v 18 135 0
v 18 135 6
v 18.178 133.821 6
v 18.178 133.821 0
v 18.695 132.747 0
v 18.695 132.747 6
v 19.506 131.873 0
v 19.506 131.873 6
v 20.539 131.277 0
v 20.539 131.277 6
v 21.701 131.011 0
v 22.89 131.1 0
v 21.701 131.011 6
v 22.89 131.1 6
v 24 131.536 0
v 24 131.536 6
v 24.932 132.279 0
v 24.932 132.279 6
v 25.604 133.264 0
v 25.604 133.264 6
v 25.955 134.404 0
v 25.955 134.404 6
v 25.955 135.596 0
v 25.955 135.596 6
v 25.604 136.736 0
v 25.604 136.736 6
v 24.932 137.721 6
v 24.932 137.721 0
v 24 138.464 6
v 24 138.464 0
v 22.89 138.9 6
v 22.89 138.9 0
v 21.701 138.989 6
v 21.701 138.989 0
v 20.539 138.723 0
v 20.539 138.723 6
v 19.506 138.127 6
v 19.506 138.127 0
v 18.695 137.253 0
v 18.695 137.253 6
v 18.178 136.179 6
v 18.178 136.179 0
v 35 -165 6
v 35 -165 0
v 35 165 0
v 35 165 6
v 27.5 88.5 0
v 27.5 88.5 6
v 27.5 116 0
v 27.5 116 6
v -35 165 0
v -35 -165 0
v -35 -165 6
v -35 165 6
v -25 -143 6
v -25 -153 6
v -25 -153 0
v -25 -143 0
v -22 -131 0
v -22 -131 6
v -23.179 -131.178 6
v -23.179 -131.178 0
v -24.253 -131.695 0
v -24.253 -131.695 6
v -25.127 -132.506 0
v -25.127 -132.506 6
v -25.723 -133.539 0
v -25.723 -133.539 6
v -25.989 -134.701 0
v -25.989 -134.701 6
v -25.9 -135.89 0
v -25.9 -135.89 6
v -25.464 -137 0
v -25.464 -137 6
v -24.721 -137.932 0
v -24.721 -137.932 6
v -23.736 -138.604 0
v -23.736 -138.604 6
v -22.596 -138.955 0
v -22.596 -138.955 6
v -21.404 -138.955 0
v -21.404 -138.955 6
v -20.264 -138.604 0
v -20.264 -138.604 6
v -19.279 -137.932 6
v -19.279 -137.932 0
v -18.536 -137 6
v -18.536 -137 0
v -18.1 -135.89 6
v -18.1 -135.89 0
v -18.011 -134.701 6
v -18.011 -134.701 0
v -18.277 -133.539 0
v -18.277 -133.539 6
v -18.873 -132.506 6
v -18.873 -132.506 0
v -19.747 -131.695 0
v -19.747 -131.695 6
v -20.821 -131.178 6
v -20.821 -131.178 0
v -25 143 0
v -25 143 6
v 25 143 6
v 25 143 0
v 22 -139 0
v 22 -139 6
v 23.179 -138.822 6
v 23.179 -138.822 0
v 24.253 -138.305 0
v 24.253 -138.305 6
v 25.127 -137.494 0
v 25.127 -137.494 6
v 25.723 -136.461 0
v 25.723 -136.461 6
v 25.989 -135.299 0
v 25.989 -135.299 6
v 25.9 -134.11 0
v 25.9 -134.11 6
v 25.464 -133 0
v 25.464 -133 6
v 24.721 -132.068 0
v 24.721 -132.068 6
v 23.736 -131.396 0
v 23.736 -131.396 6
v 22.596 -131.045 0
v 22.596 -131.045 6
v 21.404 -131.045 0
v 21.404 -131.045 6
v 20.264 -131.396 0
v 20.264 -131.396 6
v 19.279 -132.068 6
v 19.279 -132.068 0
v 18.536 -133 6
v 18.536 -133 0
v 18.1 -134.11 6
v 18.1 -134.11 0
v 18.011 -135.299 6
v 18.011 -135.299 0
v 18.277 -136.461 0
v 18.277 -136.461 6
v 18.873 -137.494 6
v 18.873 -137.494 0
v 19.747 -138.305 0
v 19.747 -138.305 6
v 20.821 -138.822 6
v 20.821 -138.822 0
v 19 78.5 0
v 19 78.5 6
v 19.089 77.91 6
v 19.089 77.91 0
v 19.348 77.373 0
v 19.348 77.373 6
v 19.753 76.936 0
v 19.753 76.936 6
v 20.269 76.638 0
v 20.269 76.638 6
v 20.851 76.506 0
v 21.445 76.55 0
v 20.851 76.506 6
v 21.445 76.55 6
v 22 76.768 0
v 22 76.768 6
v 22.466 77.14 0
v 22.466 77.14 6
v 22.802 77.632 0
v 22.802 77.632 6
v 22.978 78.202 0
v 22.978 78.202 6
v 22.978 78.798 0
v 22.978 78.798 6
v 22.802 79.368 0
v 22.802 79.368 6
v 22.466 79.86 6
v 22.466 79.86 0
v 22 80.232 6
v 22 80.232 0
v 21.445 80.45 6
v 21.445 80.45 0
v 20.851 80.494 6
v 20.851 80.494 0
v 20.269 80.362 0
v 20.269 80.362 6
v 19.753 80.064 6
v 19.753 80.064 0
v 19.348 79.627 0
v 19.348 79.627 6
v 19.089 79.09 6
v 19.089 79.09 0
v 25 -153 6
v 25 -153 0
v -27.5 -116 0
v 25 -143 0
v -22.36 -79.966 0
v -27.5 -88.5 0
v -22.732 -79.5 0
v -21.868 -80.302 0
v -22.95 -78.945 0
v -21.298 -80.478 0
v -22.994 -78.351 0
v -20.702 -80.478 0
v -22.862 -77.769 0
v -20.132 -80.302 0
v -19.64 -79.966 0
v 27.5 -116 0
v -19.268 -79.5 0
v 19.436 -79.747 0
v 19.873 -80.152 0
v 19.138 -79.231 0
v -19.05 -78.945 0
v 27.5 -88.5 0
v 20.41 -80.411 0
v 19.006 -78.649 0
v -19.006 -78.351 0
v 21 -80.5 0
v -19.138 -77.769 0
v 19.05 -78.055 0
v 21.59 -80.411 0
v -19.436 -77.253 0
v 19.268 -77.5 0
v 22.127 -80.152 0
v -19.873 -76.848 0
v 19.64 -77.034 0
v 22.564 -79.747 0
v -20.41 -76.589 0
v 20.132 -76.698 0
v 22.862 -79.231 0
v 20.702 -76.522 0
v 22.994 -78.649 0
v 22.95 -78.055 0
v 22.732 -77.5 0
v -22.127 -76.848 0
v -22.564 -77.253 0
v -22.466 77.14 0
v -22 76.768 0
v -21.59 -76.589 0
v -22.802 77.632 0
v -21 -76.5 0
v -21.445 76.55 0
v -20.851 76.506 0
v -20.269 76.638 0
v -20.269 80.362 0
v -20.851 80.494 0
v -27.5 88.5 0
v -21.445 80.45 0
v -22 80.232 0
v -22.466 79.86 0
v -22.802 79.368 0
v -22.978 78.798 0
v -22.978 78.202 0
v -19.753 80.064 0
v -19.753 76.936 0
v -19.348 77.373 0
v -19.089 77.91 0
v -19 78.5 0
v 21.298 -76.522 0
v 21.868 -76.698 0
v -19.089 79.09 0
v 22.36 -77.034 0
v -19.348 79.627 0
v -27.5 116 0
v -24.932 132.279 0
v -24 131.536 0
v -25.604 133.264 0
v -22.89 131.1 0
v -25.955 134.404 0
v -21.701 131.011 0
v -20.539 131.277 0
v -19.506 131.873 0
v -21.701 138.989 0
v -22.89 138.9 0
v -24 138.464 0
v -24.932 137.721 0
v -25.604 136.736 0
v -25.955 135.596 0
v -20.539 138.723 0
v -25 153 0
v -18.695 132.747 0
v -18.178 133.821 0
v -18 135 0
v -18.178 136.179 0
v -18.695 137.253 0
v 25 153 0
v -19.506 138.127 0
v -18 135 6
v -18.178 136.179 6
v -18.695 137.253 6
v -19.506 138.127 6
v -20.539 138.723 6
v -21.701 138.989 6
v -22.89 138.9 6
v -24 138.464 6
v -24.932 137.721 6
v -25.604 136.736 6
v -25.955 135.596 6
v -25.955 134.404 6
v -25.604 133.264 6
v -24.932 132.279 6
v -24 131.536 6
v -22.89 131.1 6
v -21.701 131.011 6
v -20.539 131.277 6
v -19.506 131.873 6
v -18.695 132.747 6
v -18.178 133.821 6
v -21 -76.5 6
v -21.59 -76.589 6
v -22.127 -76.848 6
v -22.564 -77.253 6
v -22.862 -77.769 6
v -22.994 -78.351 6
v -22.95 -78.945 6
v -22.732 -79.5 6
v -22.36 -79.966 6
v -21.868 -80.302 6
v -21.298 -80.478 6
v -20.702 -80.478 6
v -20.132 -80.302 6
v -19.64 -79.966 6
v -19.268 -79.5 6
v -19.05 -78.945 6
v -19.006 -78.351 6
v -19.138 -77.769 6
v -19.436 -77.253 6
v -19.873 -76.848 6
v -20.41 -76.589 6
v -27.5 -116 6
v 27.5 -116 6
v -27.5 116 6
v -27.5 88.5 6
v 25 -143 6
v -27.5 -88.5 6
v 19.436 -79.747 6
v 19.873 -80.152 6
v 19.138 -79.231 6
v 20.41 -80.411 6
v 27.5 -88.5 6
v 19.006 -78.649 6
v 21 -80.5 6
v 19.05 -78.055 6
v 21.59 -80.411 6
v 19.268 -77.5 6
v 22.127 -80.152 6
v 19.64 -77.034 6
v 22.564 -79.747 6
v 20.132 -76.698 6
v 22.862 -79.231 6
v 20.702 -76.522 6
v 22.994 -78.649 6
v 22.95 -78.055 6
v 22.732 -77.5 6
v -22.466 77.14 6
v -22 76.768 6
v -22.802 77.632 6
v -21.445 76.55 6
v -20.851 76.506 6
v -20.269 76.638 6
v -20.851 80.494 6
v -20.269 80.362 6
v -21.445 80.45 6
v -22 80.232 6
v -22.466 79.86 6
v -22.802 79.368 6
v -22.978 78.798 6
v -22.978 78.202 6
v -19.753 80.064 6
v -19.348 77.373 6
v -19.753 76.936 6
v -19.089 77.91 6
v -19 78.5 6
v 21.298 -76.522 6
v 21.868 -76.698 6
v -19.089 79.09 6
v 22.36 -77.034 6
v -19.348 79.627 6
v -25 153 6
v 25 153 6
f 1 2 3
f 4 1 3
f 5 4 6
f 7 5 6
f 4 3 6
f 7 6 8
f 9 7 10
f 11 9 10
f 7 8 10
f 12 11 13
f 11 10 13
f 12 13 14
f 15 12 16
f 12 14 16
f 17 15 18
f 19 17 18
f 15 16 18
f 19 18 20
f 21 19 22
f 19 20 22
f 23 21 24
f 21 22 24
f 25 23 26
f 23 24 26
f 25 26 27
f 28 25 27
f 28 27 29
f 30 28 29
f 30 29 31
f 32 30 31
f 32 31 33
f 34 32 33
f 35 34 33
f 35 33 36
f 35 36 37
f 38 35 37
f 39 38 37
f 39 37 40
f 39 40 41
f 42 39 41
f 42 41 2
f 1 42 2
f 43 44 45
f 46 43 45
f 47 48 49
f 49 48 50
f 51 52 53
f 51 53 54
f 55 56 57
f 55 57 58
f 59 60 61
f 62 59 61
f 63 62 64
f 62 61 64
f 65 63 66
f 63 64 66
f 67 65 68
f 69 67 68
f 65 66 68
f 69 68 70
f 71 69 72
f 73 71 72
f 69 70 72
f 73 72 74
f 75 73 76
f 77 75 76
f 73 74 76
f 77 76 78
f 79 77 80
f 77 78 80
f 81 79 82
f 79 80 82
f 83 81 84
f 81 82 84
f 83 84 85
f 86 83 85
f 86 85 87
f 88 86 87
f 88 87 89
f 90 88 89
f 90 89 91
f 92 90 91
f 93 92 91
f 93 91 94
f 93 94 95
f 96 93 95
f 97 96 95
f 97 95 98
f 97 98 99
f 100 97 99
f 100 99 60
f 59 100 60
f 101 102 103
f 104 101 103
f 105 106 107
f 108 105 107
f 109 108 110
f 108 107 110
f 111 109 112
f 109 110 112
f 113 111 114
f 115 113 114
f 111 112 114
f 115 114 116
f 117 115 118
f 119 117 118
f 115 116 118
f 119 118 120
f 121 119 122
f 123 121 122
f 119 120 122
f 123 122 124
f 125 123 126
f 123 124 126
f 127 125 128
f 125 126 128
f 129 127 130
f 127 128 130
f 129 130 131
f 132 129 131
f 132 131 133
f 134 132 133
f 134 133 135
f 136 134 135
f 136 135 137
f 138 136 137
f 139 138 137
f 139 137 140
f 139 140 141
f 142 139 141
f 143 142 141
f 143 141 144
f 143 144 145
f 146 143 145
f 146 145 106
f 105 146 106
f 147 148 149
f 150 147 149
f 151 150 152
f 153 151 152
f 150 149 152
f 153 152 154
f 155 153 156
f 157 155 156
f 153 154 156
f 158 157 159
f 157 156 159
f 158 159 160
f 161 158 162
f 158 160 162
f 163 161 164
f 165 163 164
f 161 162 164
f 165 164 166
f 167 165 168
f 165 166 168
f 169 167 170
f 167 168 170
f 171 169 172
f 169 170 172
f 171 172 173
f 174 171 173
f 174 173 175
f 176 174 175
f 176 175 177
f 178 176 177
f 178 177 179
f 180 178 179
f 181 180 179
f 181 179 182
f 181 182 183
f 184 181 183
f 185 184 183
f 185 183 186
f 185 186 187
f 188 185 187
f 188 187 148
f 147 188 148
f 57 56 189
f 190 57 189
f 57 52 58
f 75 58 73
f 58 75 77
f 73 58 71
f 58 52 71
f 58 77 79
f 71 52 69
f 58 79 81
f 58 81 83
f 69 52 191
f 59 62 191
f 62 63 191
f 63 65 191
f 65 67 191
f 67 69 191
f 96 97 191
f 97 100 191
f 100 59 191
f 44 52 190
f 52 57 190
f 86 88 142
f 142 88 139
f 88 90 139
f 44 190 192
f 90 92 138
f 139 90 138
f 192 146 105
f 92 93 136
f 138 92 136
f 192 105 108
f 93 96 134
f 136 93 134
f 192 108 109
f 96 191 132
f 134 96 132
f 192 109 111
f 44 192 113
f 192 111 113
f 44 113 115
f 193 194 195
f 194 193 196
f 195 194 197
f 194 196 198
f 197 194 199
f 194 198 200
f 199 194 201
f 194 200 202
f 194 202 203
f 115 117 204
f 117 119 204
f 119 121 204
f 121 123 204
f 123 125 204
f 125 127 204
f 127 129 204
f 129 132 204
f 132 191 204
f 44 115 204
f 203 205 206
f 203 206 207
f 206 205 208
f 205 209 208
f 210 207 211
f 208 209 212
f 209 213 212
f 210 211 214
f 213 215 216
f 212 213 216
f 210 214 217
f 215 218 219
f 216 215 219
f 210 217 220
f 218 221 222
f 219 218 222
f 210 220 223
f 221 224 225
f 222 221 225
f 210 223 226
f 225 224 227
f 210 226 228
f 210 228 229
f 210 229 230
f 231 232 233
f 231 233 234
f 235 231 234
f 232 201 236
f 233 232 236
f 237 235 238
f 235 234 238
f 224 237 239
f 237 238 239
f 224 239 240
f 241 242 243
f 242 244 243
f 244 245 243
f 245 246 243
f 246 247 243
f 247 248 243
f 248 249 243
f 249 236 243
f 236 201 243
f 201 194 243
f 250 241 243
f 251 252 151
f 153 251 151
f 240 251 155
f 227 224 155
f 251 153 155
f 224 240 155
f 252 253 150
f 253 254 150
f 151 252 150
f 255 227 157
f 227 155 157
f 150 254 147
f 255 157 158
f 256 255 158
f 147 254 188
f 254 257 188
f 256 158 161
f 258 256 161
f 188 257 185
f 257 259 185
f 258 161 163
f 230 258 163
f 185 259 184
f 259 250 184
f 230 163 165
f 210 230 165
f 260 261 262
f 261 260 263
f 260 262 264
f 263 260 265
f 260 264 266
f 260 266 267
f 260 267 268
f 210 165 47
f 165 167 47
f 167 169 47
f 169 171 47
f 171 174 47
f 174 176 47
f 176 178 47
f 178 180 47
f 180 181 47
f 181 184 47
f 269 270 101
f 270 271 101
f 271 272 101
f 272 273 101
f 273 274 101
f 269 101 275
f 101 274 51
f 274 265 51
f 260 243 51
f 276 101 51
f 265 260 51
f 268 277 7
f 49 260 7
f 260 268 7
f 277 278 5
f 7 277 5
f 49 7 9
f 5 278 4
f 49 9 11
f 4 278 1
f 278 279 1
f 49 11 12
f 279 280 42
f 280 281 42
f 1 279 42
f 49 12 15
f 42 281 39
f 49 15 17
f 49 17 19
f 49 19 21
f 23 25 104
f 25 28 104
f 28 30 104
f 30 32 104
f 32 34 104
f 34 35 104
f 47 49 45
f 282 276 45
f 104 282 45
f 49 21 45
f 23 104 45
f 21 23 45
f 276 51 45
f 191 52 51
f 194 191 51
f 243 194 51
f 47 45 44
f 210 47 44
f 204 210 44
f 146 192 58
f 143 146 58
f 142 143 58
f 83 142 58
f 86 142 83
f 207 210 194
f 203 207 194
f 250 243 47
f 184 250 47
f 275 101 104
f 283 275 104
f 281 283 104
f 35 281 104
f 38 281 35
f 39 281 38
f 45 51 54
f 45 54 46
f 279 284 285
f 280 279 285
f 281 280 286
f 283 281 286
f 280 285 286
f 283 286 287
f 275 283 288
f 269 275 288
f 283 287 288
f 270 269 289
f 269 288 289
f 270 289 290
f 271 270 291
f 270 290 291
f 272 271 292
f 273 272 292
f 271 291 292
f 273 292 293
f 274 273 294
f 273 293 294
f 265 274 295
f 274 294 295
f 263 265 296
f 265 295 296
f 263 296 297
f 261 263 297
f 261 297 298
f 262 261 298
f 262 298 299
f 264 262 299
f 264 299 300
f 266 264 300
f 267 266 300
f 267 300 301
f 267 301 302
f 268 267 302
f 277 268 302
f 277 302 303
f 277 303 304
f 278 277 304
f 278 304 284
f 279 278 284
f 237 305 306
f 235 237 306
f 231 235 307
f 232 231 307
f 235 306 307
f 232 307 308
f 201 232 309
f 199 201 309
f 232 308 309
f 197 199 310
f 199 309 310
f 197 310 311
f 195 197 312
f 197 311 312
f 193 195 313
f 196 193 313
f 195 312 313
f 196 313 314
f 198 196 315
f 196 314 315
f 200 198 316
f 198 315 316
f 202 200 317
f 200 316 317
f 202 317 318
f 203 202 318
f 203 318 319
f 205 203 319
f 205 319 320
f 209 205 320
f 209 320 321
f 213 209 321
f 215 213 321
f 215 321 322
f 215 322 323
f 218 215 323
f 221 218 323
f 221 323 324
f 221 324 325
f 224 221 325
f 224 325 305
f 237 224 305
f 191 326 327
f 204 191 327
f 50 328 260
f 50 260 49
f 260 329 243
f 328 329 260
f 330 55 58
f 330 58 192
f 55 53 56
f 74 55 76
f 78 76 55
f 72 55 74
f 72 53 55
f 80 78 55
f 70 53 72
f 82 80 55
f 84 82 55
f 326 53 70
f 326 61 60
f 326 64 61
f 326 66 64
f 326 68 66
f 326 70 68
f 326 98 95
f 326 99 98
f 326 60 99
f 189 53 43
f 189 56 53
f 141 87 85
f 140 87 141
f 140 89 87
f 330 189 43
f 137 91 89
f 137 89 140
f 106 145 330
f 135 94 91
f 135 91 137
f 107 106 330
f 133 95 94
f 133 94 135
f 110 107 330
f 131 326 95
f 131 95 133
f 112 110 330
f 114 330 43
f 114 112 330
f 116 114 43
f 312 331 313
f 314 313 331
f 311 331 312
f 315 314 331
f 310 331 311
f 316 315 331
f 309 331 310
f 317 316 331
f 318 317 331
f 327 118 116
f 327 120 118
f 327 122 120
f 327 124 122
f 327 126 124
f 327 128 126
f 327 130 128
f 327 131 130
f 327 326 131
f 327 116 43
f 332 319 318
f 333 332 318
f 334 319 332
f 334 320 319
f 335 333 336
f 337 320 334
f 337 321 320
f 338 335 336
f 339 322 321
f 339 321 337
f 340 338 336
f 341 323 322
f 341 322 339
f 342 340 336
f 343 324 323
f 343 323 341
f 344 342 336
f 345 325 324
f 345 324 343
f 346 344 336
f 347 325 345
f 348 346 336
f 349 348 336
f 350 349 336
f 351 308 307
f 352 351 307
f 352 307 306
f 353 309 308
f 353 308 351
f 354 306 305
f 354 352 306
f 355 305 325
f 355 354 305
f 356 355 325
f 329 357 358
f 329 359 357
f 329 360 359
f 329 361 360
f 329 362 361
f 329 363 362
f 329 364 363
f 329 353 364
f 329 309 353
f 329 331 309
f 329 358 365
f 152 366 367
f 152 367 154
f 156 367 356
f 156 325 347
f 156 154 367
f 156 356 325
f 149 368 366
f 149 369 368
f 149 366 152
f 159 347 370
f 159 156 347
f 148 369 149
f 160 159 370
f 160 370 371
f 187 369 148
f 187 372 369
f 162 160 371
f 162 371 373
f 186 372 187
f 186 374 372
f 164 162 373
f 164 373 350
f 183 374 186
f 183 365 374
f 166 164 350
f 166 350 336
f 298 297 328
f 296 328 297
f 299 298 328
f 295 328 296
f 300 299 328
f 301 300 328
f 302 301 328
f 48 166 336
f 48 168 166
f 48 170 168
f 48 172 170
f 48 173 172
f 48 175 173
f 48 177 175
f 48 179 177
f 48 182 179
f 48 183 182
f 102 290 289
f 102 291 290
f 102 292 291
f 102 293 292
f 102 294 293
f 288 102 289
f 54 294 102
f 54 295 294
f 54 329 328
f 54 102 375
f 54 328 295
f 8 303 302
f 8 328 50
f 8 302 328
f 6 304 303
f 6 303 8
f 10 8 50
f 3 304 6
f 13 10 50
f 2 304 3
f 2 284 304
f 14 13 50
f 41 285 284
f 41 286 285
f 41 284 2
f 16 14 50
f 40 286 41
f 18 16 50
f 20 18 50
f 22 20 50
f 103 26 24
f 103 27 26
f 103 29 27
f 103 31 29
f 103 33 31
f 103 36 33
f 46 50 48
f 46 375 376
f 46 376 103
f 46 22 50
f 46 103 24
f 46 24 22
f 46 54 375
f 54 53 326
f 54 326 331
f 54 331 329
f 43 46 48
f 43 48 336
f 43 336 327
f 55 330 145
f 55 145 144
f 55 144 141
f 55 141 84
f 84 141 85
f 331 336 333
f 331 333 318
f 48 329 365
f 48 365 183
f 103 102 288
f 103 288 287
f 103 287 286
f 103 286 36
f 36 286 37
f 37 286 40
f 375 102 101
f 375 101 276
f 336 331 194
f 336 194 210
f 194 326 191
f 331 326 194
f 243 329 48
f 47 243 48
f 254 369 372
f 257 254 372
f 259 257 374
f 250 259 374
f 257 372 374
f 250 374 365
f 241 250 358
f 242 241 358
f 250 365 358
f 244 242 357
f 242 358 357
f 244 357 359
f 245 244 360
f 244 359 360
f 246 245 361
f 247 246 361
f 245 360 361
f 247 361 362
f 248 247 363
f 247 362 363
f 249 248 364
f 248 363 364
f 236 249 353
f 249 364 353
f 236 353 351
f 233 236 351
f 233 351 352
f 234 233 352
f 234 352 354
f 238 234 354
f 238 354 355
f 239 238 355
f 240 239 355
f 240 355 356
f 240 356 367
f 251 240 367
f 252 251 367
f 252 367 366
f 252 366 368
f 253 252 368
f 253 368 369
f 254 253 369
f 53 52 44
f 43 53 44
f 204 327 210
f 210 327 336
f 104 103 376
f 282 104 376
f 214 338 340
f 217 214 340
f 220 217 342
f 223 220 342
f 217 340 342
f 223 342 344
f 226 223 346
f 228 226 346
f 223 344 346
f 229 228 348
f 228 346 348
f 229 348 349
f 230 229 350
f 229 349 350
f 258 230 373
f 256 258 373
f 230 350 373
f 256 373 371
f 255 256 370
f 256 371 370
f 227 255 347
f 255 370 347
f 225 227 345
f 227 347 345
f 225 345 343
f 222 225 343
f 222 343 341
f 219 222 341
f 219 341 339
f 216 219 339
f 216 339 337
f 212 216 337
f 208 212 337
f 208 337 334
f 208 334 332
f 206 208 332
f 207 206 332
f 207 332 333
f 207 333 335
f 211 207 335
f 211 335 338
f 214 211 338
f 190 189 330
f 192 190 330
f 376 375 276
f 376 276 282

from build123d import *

# Parameters (mm, degrees)
ESQUISSE1_W             = 70
ESQUISSE1_H             = 330
BOSS_EXTRU_1_DEPTH      = 6
ESQUISSE2_R             = 2
ESQUISSE2_R_2           = 4
ESQUISSE2_W             = 55
ESQUISSE2_H             = 27.5
ESQUISSE2_W_2           = 50
ESQUISSE2_H_2           = 10
ENL_V_MAT_EXTRU_2_DEPTH = 169.777960647


with BuildPart() as part:
    # Esquisse1 → Boss.-Extru.1 (new body)
    with BuildSketch(Plane.XY):
        Rectangle(ESQUISSE1_W, ESQUISSE1_H)
    extrude(amount=BOSS_EXTRU_1_DEPTH)

    # Esquisse2 → Enlèv. mat.-Extru.2 (cut, through all)
    with BuildSketch(Plane.XY.offset(6)):
        with Locations((-21, 78.5)):
            Circle(ESQUISSE2_R)
        with Locations(Location((21, 78.5, 0), (0, 0, 180))):
            Circle(ESQUISSE2_R)
        with Locations((-22, 135)):
            Circle(ESQUISSE2_R_2)
        with Locations(Location((22, 135, 0), (0, 0, 180))):
            Circle(ESQUISSE2_R_2)
        with Locations(Location((-21, -78.5, 0), (0, 0, 90))):
            Circle(ESQUISSE2_R)
        with Locations(Location((21, -78.5, 0), (0, 0, 270))):
            Circle(ESQUISSE2_R)
        with Locations(Location((-22, -135, 0), (0, 0, 90))):
            Circle(ESQUISSE2_R_2)
        with Locations(Location((22, -135, 0), (0, 0, 270))):
            Circle(ESQUISSE2_R_2)
        with Locations((0, 102.25)):
            Rectangle(ESQUISSE2_W, ESQUISSE2_H)
        with Locations((0, 148)):
            Rectangle(ESQUISSE2_W_2, ESQUISSE2_H_2)
        with Locations((0, -102.25)):
            Rectangle(ESQUISSE2_W, ESQUISSE2_H)
        with Locations((0, -148)):
            Rectangle(ESQUISSE2_W_2, ESQUISSE2_H_2)
    extrude(amount=-ENL_V_MAT_EXTRU_2_DEPTH, mode=Mode.SUBTRACT)


solid = part.part
